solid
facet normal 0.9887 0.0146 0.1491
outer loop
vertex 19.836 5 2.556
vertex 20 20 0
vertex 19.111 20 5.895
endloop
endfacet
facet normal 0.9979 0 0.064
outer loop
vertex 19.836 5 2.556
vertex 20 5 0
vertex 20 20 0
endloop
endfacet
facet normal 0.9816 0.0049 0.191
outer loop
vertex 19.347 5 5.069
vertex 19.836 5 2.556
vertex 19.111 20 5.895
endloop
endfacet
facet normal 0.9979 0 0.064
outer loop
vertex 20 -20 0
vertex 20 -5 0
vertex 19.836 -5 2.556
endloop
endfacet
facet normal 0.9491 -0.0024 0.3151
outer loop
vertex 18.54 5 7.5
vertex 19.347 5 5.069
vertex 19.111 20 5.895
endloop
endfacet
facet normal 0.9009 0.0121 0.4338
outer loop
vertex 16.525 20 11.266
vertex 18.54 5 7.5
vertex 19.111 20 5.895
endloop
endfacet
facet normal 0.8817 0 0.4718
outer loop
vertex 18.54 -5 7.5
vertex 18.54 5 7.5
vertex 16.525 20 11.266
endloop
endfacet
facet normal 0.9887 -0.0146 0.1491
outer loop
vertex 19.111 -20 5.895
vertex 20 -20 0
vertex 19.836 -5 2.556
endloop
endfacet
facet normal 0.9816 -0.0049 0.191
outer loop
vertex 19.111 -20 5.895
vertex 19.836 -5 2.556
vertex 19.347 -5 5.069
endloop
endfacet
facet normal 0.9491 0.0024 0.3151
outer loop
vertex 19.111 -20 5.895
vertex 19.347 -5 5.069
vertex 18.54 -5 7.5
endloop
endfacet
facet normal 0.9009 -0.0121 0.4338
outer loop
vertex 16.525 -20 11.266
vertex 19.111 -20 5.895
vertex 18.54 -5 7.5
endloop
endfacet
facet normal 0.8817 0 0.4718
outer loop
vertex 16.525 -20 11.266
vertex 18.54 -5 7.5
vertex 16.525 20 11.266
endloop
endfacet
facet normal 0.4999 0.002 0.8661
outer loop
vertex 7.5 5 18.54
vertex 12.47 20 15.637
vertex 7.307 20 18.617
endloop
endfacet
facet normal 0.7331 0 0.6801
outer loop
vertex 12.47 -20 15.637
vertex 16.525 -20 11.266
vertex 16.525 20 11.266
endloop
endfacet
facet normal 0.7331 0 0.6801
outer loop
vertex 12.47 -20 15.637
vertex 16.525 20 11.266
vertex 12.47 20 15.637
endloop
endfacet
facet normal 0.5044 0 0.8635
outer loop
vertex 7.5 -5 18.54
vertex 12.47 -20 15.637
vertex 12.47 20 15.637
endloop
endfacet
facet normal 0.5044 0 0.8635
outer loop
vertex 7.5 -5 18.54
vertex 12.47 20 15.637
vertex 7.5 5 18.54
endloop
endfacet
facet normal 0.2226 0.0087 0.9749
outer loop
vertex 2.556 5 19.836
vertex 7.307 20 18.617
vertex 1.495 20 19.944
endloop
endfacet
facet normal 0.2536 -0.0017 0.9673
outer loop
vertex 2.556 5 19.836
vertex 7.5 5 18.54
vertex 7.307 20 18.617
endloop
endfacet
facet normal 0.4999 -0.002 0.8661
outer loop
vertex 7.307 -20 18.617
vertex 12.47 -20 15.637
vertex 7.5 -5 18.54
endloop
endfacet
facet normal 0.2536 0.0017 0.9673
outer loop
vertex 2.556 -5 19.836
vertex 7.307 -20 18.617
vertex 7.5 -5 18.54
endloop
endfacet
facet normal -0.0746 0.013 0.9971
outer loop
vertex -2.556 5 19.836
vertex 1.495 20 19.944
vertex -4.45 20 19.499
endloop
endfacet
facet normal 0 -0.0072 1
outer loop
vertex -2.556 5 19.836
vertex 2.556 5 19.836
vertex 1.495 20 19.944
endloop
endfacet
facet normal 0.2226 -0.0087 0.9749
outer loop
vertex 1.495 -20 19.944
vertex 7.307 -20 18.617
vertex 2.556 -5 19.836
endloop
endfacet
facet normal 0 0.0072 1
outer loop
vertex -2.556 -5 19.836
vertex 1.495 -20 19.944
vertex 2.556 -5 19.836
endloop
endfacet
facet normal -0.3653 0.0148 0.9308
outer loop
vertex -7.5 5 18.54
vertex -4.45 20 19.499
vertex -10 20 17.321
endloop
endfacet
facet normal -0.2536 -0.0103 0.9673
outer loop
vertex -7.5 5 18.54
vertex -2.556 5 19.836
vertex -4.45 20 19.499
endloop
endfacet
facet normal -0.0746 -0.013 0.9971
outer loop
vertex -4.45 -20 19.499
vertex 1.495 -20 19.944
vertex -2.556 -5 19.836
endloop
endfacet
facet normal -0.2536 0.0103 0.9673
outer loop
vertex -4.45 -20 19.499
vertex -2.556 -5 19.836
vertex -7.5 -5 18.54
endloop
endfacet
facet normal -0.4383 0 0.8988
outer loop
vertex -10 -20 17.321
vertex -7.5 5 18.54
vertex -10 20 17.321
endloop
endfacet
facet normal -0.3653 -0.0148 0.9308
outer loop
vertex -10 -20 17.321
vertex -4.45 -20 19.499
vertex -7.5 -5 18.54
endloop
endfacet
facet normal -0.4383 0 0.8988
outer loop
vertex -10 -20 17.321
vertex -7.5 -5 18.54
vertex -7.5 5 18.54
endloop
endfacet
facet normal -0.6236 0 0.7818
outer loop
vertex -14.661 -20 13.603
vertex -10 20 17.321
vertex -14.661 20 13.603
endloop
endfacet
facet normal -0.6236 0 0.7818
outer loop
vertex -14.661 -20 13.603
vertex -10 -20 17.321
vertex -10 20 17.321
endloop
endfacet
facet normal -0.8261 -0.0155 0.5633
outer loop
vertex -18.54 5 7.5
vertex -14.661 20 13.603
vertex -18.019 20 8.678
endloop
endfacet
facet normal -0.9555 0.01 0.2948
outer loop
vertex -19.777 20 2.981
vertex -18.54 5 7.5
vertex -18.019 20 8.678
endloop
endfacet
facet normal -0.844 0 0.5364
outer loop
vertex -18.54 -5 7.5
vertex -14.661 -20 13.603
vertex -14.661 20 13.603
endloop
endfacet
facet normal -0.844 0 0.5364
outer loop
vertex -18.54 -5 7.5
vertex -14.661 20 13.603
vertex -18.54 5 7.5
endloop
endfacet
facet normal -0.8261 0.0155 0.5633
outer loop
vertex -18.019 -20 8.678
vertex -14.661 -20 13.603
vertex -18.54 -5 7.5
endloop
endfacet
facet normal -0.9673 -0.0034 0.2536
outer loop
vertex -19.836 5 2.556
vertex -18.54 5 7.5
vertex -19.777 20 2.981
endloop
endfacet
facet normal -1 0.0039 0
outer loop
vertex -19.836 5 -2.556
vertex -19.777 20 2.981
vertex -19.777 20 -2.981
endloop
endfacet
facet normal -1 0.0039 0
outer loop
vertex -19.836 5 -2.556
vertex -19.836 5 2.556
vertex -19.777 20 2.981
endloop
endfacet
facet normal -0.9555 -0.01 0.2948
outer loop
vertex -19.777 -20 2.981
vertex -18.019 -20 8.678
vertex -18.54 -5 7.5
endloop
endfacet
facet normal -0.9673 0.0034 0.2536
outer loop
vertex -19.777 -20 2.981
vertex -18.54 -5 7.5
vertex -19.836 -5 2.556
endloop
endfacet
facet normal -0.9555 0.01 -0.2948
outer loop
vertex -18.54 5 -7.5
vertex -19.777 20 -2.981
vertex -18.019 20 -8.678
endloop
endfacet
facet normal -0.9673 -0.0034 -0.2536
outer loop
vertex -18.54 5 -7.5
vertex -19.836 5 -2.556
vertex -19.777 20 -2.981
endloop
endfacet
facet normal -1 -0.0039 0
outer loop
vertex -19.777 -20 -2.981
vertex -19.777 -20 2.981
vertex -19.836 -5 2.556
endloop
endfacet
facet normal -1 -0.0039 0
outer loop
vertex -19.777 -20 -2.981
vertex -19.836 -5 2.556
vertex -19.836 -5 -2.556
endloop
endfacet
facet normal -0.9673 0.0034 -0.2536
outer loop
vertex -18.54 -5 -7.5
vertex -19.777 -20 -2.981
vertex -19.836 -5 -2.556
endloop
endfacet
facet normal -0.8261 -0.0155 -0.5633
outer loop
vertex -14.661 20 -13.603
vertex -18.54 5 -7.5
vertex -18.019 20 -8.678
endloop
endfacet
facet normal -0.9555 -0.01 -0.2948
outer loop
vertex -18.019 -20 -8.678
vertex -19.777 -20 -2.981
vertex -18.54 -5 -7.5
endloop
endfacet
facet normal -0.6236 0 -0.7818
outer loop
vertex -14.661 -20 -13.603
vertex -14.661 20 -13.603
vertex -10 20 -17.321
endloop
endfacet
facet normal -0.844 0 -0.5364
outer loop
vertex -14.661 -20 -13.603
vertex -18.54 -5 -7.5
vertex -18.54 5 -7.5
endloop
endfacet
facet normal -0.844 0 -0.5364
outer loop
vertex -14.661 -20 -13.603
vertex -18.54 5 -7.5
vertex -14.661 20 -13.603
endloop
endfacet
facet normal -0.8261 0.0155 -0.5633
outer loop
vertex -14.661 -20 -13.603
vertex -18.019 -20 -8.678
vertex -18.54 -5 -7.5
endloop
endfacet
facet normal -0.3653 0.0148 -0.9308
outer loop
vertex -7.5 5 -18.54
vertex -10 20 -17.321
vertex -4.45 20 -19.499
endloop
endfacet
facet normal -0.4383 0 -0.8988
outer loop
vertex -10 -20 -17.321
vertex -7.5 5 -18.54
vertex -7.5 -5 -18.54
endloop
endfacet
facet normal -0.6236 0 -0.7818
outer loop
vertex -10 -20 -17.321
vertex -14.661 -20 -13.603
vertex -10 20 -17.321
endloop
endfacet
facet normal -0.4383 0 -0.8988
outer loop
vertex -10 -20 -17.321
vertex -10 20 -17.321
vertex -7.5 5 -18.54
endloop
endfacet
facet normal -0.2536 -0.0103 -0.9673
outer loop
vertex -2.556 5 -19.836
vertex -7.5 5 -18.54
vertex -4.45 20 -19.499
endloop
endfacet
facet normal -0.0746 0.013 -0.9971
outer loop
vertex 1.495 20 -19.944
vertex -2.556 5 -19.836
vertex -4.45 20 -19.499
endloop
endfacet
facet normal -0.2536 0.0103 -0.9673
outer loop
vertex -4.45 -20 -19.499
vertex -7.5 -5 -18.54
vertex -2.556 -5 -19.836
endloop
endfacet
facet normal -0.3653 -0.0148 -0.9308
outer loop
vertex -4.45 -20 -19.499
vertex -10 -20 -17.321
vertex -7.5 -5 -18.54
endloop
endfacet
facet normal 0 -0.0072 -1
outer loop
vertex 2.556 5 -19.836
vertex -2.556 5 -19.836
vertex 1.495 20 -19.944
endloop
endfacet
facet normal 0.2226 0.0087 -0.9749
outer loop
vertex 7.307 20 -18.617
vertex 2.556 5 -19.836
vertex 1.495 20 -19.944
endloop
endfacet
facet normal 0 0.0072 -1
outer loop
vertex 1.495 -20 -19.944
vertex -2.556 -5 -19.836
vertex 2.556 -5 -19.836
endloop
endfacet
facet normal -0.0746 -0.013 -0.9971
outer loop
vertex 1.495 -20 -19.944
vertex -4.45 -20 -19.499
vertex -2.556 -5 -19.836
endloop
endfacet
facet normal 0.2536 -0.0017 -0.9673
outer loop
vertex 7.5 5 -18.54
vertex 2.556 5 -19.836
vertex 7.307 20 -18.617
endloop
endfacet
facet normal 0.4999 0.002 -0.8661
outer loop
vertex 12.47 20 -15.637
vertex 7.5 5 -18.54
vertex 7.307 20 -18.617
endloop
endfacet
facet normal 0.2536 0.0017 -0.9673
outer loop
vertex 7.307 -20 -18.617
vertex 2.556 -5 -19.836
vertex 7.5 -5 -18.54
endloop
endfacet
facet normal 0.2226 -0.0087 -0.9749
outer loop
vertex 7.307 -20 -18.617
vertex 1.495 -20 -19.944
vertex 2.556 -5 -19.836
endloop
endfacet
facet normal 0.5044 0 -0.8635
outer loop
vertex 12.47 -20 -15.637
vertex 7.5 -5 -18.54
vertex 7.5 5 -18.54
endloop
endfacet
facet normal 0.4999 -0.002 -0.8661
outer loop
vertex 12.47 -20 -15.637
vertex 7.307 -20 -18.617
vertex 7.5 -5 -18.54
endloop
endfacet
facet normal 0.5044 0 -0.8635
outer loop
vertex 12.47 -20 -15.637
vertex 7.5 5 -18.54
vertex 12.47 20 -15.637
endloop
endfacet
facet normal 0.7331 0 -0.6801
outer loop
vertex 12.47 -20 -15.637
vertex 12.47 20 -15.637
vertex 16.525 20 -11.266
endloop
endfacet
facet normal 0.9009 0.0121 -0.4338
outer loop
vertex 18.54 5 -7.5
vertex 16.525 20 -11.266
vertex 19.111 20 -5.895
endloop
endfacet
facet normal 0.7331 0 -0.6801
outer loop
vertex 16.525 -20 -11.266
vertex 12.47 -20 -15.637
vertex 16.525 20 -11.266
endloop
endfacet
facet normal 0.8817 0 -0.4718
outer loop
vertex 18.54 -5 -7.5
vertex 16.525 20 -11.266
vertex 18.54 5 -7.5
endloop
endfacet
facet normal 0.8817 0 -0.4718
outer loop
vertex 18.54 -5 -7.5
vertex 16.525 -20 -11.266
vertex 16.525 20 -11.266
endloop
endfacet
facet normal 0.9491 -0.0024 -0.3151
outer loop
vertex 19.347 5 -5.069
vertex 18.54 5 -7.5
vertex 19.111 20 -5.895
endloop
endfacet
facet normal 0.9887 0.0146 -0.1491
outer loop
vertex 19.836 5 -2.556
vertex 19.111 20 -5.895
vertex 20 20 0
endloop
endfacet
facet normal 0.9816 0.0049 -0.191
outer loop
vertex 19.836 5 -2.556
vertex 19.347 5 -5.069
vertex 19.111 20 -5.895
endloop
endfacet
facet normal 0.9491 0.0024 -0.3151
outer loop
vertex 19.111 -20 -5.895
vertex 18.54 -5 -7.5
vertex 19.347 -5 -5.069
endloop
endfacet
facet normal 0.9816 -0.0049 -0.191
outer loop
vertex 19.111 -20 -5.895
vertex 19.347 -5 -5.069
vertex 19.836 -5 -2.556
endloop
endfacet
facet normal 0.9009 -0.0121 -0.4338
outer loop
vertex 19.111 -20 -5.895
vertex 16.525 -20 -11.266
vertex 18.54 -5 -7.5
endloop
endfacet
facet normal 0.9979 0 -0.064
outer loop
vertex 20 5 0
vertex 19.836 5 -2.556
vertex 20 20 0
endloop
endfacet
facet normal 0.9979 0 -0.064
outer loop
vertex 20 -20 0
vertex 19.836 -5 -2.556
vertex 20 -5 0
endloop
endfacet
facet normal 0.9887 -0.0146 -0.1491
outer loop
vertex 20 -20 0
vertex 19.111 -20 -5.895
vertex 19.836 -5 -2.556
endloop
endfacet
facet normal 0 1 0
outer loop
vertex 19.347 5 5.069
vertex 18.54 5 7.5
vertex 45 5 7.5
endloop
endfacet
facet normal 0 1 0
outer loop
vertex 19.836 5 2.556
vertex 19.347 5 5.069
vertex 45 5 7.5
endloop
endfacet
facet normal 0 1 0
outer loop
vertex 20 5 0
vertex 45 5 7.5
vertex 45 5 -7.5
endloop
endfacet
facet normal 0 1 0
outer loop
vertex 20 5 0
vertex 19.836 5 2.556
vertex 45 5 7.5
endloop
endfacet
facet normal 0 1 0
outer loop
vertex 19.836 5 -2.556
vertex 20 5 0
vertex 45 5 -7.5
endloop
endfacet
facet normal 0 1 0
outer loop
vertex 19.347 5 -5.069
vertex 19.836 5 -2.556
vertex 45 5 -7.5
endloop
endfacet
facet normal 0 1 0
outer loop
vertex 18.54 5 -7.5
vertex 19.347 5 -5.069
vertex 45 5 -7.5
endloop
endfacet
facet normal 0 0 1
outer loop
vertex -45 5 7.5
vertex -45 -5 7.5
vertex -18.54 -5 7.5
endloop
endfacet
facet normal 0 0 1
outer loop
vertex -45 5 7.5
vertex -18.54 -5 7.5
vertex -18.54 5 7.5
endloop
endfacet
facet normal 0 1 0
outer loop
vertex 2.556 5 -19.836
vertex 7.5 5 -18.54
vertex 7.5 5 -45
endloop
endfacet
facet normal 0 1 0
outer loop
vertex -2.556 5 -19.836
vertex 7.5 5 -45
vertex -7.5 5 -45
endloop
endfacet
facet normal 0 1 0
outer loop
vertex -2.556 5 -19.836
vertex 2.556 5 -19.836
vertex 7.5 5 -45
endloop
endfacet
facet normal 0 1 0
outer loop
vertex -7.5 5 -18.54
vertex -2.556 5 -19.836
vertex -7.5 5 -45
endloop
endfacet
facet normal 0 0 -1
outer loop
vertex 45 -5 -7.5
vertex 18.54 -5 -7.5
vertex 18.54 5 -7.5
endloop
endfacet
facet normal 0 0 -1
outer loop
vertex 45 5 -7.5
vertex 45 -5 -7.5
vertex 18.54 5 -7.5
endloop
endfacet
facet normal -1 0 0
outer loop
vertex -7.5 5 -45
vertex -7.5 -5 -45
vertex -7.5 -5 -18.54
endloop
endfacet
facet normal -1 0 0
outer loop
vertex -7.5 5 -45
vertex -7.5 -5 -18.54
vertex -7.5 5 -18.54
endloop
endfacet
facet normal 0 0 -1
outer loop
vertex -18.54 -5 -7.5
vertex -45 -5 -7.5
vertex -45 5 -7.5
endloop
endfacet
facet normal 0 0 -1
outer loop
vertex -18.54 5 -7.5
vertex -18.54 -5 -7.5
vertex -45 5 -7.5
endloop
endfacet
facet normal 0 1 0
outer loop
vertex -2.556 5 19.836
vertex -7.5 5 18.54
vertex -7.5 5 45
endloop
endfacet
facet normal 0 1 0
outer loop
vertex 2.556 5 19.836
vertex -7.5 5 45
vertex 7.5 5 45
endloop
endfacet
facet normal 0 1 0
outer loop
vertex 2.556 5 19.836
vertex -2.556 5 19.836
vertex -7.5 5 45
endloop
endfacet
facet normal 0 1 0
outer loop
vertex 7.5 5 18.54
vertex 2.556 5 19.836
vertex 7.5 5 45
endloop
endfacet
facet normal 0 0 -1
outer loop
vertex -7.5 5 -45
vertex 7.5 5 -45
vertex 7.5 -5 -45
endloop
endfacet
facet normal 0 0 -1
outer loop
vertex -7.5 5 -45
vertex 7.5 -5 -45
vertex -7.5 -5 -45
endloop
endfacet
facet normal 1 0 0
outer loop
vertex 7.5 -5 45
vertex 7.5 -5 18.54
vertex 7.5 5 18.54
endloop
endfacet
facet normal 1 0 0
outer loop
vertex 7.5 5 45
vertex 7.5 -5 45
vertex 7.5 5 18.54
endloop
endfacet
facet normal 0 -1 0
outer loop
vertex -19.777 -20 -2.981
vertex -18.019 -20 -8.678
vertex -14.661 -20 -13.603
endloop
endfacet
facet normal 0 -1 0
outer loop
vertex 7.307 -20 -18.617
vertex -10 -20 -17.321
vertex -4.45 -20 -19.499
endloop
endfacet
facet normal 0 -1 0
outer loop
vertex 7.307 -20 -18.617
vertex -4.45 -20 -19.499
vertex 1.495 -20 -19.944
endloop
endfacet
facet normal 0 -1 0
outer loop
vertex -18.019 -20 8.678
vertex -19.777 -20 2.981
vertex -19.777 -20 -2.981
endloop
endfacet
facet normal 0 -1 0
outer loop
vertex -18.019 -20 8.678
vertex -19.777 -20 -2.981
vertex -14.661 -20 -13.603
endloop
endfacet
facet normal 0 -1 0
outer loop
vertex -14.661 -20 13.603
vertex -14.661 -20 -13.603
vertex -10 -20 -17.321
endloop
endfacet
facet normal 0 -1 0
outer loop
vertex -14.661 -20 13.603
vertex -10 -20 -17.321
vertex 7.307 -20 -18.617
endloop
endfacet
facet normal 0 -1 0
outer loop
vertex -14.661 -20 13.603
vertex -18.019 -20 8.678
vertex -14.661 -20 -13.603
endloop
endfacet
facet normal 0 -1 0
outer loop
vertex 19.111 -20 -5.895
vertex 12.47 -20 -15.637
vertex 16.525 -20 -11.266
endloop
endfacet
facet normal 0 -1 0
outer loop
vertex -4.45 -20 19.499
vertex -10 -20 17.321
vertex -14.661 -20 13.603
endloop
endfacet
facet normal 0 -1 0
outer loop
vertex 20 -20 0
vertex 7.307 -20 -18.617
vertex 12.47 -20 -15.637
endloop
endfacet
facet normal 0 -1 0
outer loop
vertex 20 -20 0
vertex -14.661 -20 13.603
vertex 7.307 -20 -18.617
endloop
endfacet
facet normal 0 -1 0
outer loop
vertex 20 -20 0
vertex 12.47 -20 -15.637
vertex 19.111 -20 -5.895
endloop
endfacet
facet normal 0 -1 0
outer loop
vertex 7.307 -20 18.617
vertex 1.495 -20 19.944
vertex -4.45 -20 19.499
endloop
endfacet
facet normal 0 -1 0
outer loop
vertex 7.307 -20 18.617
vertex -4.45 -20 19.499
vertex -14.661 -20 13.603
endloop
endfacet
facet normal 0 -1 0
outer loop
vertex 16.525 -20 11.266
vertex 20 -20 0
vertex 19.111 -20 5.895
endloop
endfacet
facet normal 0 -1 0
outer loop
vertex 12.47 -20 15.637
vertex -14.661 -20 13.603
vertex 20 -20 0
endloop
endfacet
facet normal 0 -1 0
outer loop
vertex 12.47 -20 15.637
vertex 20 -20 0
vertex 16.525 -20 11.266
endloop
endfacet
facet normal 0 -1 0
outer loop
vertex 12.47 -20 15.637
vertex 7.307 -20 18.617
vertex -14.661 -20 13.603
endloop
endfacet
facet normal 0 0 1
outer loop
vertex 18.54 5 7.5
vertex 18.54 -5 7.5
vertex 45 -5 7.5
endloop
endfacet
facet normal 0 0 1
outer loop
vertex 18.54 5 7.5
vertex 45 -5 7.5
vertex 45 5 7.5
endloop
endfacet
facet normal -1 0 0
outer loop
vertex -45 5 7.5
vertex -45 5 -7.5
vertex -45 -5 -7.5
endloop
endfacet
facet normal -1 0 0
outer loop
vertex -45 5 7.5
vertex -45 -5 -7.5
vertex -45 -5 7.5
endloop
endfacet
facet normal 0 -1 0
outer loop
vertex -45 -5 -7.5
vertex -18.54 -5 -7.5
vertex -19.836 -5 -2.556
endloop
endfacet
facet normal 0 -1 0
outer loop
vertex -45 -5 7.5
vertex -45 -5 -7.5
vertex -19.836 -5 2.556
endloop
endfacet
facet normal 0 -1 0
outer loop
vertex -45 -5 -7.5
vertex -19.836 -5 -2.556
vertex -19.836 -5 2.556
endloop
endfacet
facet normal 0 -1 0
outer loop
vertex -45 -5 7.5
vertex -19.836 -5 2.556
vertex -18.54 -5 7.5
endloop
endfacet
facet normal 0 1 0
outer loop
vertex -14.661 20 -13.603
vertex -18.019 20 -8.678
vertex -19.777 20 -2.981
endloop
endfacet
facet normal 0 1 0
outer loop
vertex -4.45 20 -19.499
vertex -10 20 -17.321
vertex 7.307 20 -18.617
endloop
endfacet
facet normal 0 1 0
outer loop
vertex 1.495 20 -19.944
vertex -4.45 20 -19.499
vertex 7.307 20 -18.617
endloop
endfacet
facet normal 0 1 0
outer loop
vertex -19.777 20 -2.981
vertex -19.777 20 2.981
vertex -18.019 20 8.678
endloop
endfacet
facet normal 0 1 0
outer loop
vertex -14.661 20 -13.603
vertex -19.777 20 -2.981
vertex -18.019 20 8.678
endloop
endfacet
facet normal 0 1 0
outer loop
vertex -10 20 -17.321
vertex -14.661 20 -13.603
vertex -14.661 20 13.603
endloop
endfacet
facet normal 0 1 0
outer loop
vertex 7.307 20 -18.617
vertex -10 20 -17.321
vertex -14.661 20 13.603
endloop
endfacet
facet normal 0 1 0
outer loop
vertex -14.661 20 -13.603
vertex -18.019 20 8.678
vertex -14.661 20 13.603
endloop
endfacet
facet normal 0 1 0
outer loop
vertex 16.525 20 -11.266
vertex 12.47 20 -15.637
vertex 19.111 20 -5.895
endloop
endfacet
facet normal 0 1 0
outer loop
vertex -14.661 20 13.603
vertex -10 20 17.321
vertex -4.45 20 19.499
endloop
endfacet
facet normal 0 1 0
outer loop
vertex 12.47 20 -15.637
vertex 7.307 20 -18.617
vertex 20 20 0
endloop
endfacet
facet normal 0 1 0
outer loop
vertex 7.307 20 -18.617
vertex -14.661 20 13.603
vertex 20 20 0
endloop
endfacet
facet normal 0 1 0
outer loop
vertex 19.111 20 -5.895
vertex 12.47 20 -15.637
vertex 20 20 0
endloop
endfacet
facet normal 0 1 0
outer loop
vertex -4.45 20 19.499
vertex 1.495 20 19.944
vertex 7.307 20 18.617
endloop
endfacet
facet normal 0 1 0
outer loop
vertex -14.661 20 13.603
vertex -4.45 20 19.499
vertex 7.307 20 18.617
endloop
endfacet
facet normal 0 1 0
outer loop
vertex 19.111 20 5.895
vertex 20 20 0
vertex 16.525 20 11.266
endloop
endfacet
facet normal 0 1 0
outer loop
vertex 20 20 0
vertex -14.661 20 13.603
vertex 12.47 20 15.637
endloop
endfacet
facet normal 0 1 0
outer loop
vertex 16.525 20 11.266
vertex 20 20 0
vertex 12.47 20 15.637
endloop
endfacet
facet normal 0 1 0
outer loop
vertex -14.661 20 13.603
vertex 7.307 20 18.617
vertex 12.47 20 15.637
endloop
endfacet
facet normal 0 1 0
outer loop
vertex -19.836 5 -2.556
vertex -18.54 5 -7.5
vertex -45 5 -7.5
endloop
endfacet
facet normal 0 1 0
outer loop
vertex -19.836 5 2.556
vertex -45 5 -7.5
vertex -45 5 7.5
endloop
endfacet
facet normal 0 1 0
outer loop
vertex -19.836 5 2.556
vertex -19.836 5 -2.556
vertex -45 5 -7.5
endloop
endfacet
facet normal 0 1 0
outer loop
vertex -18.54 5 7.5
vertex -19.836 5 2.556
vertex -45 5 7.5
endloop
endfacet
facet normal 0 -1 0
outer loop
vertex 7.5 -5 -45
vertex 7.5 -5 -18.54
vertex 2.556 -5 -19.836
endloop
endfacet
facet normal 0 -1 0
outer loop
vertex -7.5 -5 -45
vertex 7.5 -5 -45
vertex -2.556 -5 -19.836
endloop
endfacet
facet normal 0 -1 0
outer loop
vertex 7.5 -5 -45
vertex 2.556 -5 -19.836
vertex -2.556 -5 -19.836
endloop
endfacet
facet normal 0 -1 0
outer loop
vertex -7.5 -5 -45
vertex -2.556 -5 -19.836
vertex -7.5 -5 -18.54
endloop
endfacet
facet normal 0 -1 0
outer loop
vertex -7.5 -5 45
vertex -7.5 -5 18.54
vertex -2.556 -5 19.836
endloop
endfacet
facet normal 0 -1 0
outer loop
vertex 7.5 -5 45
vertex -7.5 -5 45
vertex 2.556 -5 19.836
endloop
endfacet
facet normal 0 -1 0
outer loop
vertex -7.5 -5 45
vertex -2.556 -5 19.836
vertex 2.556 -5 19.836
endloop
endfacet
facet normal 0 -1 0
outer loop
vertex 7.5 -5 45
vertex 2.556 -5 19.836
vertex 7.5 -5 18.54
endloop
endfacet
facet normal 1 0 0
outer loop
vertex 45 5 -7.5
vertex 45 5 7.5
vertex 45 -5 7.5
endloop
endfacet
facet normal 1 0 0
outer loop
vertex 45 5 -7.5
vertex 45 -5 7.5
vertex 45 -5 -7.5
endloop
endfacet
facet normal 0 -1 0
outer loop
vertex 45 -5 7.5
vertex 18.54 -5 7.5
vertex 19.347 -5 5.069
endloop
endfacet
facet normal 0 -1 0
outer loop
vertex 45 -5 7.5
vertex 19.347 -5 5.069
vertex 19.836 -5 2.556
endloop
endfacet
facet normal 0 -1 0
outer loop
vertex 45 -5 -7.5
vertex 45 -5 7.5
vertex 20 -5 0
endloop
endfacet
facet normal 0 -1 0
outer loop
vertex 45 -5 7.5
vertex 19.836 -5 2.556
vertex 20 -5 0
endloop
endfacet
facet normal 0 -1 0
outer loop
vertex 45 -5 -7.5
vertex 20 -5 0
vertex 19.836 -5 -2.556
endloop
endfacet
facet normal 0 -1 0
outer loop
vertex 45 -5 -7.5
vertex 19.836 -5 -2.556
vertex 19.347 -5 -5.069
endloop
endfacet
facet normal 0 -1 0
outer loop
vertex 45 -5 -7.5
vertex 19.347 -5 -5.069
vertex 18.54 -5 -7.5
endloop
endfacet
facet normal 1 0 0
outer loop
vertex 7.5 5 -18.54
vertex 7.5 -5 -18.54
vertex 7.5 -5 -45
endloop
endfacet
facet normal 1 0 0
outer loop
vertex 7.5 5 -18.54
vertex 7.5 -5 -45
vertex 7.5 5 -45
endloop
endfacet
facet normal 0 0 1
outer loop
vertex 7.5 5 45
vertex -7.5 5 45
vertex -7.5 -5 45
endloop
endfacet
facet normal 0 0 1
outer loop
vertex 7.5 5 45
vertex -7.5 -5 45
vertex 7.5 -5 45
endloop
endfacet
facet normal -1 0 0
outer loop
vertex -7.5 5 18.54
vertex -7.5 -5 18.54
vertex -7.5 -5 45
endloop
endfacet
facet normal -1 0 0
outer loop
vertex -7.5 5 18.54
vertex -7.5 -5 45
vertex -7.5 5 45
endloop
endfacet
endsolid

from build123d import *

# Parameters (mm, degrees)
F0_R            = 20
F1_DEPTH        = 20
F3_W            = 15
F3_H            = 10
F4_DEPTH        = 30
F4_COPIES_COUNT = 4


# Not quite as in the source:
# - a pattern or mirror of a feature is missing from the dataset's text; its kind, count and spacing are read off the source's solid


with BuildPart() as f1:
    # F0 (on Front) → F1 (new body, symmetric)
    with BuildSketch(Plane.XZ):
        Circle(F0_R)
    extrude(amount=F1_DEPTH, both=True)

    # F3 (on offset) → F4 (join)
    with BuildSketch(Plane.XY.offset(15)):
        Rectangle(F3_W, F3_H)
    f4 = extrude(amount=F4_DEPTH)

    # F4_copies: F4 ×4 about axis
    f4_copies_axis = Axis((0, 0, 0), (0, 1, 0))
    for i in range(1, F4_COPIES_COUNT):
        add(f4.rotate(f4_copies_axis, i * 360 / F4_COPIES_COUNT))


solid = f1.part
